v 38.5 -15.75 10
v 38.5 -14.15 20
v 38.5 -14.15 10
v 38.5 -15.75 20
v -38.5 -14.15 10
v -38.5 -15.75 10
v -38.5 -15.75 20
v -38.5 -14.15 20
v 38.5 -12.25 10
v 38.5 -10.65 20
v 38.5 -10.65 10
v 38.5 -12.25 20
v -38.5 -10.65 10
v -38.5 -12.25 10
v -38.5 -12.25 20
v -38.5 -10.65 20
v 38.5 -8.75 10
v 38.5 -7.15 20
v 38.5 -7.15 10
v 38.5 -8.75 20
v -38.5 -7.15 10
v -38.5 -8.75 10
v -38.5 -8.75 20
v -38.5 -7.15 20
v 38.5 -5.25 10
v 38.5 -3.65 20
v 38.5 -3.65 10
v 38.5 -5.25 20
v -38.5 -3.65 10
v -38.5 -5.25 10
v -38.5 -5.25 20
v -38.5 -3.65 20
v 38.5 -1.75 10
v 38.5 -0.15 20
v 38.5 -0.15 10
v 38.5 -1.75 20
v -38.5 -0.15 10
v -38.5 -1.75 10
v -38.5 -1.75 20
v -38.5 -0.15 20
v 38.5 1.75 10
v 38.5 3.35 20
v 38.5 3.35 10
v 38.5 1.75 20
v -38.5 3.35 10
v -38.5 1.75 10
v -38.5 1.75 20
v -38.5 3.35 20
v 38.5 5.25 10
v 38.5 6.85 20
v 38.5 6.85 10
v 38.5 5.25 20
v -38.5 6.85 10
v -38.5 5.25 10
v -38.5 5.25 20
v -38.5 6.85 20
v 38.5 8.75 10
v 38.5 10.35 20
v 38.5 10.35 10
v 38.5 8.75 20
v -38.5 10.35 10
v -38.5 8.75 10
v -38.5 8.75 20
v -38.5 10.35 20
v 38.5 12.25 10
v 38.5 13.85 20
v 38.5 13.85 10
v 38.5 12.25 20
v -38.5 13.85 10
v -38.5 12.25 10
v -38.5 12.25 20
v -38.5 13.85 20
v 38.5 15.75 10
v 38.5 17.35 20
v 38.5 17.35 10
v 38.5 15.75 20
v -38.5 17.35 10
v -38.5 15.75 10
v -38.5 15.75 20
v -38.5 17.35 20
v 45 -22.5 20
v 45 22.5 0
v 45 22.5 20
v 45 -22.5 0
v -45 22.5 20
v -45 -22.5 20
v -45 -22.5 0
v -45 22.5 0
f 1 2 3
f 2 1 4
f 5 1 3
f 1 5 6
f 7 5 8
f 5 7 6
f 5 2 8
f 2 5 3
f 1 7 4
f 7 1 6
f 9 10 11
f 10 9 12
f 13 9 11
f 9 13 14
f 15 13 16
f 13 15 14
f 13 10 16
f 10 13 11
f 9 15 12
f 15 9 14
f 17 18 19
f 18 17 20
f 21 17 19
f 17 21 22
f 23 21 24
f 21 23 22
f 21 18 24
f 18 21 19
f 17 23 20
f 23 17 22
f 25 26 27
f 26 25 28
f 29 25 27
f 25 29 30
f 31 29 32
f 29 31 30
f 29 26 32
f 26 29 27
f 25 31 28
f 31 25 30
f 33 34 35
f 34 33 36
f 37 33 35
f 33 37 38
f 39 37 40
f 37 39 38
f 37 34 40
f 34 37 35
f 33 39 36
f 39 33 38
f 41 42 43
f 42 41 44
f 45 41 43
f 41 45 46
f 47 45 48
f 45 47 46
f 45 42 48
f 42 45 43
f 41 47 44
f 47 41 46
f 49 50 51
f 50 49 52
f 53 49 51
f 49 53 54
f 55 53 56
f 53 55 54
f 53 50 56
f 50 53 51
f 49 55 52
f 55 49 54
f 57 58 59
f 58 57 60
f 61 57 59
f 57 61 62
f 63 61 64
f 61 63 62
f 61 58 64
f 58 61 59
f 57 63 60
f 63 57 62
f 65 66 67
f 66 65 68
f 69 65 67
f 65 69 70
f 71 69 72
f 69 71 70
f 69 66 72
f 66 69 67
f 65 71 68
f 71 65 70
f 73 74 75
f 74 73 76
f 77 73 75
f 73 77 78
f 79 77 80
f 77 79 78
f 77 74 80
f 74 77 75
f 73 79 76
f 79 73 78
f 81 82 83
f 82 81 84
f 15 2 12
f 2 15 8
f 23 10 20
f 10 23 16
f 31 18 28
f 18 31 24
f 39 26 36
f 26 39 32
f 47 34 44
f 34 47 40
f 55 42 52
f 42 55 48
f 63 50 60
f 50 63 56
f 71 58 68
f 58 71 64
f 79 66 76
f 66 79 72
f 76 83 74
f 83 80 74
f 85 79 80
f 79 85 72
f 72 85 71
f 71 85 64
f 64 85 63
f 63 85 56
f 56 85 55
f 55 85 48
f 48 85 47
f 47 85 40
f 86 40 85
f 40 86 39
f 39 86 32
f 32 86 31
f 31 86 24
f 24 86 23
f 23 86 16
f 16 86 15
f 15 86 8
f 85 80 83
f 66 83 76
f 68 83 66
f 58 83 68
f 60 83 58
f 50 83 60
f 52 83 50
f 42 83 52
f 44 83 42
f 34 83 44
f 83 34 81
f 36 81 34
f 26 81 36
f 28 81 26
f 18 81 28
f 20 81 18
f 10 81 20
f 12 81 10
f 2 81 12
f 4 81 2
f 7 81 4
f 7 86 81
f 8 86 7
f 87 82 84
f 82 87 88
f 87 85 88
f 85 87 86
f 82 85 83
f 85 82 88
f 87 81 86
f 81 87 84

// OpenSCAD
// Slide drying rack - holds 10 microscope slides upright on their long edge
// Print orientation: base block on the bed (z = 0), slots open upward.

// ---------------- Parameters ----------------
block_len    = 90;    // base block length along X (mm)
block_wid    = 45;    // base block width along Y (mm)
block_h      = 20;    // base block height along Z (mm)

slot_len     = 77;    // slot length along X (mm)
slot_w       = 1.6;   // slot width along Y (mm)
slot_depth   = 10;    // slot depth from top face (mm)
slot_pitch   = 3.5;   // centre-to-centre spacing of slots in Y (mm)
slot_count   = 10;    // number of slide slots

eps          = 0.5;   // overshoot so cutters pass through the top face (mm)

$fn = 64;

// ---------------- Model ----------------
difference() {
    // Base block, centred in X and Y, sitting on z = 0
    translate([-block_len/2, -block_wid/2, 0])
        cube([block_len, block_wid, block_h]);

    // Row of parallel slots, centred on the block in X and Y
    for (i = [0 : slot_count - 1]) {
        y = (i - (slot_count - 1)/2) * slot_pitch;
        translate([-slot_len/2, y, block_h - slot_depth])
            cube([slot_len, slot_w, slot_depth + eps]);
    }
}
